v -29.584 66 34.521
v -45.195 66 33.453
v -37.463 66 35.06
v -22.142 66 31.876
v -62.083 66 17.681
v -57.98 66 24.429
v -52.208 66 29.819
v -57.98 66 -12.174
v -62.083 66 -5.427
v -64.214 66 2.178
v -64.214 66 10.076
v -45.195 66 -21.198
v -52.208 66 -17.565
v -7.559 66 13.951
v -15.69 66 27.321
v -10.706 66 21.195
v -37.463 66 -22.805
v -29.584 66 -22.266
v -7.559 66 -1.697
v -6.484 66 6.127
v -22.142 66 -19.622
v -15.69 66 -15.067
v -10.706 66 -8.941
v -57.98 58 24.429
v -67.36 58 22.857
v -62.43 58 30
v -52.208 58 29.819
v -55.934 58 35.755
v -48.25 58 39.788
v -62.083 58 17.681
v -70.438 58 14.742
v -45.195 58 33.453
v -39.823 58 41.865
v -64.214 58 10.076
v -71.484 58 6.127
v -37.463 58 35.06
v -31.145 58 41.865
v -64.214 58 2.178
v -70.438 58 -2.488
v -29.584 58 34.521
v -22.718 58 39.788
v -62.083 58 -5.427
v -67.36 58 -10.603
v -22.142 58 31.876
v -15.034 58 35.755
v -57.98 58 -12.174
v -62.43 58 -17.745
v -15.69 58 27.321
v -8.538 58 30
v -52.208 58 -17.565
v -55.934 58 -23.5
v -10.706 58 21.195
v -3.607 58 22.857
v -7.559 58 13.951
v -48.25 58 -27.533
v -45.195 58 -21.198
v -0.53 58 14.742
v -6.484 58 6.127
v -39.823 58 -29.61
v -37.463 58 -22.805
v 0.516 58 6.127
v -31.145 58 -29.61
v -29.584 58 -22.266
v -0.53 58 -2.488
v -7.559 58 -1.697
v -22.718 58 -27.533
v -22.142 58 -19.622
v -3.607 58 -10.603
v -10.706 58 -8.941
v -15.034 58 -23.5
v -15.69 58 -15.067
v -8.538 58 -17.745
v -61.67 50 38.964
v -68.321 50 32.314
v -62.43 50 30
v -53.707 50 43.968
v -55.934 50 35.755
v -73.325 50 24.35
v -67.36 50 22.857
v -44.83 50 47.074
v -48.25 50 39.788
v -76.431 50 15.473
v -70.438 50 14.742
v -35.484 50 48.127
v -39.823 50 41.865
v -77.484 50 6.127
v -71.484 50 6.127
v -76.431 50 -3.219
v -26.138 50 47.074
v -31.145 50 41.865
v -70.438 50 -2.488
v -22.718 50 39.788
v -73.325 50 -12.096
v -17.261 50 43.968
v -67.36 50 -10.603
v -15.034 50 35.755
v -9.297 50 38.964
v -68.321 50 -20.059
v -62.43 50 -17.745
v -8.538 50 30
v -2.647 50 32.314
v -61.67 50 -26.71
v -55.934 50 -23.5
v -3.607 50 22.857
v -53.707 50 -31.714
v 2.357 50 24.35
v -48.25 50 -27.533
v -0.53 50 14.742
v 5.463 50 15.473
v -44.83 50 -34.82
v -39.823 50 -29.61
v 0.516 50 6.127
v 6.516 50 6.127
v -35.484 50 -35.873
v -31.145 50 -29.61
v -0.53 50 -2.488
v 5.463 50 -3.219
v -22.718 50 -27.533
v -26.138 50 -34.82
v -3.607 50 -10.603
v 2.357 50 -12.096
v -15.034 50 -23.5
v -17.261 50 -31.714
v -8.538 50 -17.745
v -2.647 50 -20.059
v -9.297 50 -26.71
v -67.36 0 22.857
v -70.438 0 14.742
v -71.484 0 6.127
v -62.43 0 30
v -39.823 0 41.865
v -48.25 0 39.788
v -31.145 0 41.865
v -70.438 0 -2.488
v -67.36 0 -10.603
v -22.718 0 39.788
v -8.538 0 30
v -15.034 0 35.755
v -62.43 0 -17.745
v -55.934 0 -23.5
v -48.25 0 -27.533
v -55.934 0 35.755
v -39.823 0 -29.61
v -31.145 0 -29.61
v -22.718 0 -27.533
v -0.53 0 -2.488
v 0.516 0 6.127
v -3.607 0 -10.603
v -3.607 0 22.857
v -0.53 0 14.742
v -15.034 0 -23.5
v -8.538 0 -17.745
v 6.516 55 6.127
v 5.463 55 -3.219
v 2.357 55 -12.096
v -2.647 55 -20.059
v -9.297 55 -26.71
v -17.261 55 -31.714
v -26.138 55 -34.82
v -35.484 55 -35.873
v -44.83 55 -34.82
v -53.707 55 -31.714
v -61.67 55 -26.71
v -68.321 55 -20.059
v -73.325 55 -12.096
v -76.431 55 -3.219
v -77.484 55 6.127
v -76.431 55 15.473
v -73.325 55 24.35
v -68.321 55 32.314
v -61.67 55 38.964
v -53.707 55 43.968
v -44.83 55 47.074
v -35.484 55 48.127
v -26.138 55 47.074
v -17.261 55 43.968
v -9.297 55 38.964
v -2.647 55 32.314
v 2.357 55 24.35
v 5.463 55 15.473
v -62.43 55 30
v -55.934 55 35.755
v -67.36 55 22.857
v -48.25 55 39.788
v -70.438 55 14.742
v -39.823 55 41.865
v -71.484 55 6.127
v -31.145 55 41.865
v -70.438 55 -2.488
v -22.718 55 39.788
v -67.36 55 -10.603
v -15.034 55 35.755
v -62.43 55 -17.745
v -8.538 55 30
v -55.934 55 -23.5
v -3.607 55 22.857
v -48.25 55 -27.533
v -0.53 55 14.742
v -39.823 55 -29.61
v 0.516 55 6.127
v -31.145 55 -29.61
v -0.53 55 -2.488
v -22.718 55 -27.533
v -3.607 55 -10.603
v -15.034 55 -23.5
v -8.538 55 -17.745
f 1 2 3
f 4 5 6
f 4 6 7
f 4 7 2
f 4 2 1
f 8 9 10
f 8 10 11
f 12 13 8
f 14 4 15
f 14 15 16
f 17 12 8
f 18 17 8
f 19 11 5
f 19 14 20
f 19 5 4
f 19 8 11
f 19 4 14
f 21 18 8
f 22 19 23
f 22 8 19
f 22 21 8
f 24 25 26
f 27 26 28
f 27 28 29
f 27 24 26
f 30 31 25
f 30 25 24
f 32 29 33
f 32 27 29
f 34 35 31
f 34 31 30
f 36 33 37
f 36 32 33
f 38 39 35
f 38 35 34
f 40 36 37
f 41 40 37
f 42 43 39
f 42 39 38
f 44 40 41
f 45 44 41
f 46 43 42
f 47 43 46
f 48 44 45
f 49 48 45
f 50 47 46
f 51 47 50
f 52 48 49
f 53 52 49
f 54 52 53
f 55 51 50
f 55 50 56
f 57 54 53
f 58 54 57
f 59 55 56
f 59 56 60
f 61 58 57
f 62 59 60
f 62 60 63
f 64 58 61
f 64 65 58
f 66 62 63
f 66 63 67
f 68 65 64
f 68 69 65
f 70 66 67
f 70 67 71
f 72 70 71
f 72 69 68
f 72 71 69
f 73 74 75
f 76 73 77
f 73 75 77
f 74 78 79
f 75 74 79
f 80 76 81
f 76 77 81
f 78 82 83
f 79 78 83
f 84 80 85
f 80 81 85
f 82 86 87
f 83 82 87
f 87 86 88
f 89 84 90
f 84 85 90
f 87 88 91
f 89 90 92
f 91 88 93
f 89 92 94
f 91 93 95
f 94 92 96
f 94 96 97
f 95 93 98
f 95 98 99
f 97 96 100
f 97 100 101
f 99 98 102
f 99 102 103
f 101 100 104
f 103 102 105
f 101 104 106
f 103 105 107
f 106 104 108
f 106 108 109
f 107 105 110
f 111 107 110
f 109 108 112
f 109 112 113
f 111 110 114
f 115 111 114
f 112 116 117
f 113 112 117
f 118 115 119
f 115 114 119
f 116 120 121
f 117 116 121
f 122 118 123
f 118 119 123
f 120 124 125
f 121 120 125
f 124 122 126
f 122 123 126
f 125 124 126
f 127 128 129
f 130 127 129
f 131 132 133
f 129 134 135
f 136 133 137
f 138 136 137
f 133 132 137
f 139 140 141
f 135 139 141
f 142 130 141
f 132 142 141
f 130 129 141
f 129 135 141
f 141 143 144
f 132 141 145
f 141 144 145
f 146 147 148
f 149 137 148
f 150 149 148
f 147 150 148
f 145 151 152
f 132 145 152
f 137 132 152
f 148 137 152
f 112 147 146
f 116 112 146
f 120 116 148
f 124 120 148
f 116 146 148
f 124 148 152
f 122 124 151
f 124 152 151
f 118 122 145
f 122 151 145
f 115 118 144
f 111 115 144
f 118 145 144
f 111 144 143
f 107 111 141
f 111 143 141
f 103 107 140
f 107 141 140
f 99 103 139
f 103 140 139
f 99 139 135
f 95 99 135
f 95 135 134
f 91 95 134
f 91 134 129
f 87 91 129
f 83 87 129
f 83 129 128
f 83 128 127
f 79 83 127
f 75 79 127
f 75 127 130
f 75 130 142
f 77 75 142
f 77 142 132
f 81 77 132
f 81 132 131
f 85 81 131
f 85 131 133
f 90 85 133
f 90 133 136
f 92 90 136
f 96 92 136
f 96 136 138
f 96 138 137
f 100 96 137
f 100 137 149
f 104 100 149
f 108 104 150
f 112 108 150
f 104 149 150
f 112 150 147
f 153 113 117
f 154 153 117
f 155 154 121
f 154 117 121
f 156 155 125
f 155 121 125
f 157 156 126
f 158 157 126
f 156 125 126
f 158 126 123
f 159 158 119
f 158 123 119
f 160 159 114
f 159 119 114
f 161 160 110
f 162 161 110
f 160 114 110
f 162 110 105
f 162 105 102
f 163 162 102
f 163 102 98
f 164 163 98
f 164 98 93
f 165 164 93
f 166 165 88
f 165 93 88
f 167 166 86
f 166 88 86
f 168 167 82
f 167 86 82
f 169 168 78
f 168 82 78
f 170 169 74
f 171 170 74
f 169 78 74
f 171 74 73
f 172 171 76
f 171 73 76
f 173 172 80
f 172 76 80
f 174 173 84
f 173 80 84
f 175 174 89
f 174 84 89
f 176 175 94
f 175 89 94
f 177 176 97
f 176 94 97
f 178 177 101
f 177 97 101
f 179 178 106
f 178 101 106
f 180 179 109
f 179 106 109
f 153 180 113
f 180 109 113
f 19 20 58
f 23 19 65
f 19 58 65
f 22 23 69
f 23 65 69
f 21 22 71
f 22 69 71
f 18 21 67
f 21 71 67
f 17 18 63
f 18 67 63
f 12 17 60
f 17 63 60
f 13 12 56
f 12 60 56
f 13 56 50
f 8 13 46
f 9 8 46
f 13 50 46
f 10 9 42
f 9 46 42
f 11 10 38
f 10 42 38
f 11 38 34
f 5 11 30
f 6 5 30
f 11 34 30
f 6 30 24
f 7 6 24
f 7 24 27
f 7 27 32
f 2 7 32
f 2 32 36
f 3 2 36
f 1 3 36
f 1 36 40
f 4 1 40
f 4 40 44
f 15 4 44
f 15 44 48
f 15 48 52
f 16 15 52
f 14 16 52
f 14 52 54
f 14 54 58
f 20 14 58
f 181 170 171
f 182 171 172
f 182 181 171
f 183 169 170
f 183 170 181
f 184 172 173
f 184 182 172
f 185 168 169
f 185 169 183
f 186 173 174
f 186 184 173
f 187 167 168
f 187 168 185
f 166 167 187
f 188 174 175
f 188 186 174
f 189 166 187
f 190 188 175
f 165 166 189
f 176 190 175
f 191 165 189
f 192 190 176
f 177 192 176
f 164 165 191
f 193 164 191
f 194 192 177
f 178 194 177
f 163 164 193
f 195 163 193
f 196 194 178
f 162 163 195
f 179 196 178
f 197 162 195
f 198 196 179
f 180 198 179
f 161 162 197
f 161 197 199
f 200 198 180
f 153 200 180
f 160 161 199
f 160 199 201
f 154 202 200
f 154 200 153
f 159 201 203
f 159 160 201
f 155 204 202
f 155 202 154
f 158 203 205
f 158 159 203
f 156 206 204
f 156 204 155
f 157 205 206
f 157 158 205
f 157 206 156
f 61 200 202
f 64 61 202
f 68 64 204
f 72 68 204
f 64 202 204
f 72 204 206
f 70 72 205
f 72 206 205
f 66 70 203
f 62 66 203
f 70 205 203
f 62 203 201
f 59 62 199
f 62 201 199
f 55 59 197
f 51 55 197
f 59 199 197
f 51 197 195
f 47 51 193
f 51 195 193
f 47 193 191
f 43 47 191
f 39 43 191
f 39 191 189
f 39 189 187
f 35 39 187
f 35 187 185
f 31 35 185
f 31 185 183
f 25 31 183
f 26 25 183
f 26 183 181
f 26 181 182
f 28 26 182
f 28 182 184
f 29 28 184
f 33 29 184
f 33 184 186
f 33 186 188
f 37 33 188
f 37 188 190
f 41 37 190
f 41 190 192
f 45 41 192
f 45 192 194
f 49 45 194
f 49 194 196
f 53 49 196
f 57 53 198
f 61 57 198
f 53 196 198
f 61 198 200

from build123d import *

# Parameters (mm, degrees)
SKETCH_2_R      = 29
EXTRUDE_1_DEPTH = 66
SKETCH_2_3_R    = 36
EXTRUDE_2_DEPTH = 58
EXTRUDE_START   = 50
SKETCH_2_4_R    = 42
SKETCH_2_4_R_2  = 36
EXTRUDE_3_DEPTH = 5


with BuildPart() as part:
    # 草图2 → 凸台-拉伸1 (new body)
    with BuildSketch(Plane(origin=(0, 0, 0), x_dir=(1, 0, 0), z_dir=(0, 1, 0))):
        with Locations((-35.483898972, -6.127114057)):
            Circle(SKETCH_2_R)
    extrude(amount=EXTRUDE_1_DEPTH)

    # 草图2<3> → 凸台-拉伸2 (add)
    with BuildSketch(Plane(origin=(0, 0, 0), x_dir=(1, 0, 0), z_dir=(0, 1, 0))):
        with Locations((-35.483898972, -6.127114057)):
            Circle(SKETCH_2_3_R)
    extrude(amount=EXTRUDE_2_DEPTH)

    # 草图2<4> → 凸台-拉伸3 (add)
    with BuildSketch(Plane(origin=(0, 0, 0), x_dir=(1, 0, 0), z_dir=(0, 1, 0)).offset(EXTRUDE_START)):
        with Locations((-35.483898972, -6.127114057)):
            Circle(SKETCH_2_4_R)
        with Locations((-35.483898972, -6.127114057)):
            Circle(SKETCH_2_4_R_2, mode=Mode.SUBTRACT)
    extrude(amount=EXTRUDE_3_DEPTH)


solid = part.part
